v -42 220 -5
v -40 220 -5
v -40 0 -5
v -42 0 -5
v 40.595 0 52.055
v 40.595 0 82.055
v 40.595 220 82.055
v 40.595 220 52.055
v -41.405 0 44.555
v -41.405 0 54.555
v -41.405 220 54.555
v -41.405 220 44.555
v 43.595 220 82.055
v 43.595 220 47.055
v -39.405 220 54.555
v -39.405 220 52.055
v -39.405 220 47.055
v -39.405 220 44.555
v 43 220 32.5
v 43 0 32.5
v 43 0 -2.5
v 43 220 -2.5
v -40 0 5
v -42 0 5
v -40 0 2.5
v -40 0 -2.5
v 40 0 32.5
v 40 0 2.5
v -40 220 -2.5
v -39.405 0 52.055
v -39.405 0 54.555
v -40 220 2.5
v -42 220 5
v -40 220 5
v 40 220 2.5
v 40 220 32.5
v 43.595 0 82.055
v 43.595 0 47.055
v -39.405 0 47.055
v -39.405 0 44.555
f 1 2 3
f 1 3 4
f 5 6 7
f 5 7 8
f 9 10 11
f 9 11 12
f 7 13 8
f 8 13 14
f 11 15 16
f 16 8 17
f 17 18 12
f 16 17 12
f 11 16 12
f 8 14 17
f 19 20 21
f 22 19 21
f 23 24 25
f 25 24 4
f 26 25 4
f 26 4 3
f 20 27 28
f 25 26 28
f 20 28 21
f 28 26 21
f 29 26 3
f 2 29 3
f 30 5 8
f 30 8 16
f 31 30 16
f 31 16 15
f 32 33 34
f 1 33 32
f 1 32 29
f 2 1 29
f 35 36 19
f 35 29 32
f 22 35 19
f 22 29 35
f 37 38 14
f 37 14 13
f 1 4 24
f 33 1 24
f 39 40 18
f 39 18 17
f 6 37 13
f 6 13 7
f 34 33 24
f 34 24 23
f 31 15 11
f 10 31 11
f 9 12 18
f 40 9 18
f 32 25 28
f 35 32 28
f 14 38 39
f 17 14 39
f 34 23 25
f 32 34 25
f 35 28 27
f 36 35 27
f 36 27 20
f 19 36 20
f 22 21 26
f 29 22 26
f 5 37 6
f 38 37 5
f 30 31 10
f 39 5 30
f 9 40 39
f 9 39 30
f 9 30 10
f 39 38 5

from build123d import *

# Parameters (mm, degrees)
EXTRUDE_1_DEPTH   = 220
EXTRUDE_1_2_DEPTH = 220


with BuildPart() as part:
    # 草图1 → 凸台-拉伸1 (new body)
    with BuildSketch(Plane(origin=(0, 0, 0), x_dir=(1, 0, 0), z_dir=(0, 1, 0))):
        Polygon((-40, 2.5), (-40, 5), (-42, 5), (-42, -5), (-40, -5), (-40, -2.5), (40, -2.5), (40, -32.5), (43, -32.5), (43, 2.5), (40, 2.5), align=None)
    extrude(amount=EXTRUDE_1_DEPTH)


with BuildPart() as body_2:
    # 草图1 → Extrude 1 2 (new body)
    with BuildSketch(Plane(origin=(0, 0, 0), x_dir=(1, 0, 0), z_dir=(0, 1, 0))):
        Polygon((-39.404935515, -47.054520884), (40.595064485, -47.054520884), (43.595064485, -47.054520884), (43.595064485, -82.054520884), (40.595064485, -82.054520884), (40.595064485, -52.054520884), (-39.404935515, -52.054520884), (-39.404935515, -54.554520884), (-41.404935515, -54.554520884), (-41.404935515, -44.554520884), (-39.404935515, -44.554520884), align=None)
    extrude(amount=EXTRUDE_1_2_DEPTH)


solid = Compound([part.part, body_2.part])
